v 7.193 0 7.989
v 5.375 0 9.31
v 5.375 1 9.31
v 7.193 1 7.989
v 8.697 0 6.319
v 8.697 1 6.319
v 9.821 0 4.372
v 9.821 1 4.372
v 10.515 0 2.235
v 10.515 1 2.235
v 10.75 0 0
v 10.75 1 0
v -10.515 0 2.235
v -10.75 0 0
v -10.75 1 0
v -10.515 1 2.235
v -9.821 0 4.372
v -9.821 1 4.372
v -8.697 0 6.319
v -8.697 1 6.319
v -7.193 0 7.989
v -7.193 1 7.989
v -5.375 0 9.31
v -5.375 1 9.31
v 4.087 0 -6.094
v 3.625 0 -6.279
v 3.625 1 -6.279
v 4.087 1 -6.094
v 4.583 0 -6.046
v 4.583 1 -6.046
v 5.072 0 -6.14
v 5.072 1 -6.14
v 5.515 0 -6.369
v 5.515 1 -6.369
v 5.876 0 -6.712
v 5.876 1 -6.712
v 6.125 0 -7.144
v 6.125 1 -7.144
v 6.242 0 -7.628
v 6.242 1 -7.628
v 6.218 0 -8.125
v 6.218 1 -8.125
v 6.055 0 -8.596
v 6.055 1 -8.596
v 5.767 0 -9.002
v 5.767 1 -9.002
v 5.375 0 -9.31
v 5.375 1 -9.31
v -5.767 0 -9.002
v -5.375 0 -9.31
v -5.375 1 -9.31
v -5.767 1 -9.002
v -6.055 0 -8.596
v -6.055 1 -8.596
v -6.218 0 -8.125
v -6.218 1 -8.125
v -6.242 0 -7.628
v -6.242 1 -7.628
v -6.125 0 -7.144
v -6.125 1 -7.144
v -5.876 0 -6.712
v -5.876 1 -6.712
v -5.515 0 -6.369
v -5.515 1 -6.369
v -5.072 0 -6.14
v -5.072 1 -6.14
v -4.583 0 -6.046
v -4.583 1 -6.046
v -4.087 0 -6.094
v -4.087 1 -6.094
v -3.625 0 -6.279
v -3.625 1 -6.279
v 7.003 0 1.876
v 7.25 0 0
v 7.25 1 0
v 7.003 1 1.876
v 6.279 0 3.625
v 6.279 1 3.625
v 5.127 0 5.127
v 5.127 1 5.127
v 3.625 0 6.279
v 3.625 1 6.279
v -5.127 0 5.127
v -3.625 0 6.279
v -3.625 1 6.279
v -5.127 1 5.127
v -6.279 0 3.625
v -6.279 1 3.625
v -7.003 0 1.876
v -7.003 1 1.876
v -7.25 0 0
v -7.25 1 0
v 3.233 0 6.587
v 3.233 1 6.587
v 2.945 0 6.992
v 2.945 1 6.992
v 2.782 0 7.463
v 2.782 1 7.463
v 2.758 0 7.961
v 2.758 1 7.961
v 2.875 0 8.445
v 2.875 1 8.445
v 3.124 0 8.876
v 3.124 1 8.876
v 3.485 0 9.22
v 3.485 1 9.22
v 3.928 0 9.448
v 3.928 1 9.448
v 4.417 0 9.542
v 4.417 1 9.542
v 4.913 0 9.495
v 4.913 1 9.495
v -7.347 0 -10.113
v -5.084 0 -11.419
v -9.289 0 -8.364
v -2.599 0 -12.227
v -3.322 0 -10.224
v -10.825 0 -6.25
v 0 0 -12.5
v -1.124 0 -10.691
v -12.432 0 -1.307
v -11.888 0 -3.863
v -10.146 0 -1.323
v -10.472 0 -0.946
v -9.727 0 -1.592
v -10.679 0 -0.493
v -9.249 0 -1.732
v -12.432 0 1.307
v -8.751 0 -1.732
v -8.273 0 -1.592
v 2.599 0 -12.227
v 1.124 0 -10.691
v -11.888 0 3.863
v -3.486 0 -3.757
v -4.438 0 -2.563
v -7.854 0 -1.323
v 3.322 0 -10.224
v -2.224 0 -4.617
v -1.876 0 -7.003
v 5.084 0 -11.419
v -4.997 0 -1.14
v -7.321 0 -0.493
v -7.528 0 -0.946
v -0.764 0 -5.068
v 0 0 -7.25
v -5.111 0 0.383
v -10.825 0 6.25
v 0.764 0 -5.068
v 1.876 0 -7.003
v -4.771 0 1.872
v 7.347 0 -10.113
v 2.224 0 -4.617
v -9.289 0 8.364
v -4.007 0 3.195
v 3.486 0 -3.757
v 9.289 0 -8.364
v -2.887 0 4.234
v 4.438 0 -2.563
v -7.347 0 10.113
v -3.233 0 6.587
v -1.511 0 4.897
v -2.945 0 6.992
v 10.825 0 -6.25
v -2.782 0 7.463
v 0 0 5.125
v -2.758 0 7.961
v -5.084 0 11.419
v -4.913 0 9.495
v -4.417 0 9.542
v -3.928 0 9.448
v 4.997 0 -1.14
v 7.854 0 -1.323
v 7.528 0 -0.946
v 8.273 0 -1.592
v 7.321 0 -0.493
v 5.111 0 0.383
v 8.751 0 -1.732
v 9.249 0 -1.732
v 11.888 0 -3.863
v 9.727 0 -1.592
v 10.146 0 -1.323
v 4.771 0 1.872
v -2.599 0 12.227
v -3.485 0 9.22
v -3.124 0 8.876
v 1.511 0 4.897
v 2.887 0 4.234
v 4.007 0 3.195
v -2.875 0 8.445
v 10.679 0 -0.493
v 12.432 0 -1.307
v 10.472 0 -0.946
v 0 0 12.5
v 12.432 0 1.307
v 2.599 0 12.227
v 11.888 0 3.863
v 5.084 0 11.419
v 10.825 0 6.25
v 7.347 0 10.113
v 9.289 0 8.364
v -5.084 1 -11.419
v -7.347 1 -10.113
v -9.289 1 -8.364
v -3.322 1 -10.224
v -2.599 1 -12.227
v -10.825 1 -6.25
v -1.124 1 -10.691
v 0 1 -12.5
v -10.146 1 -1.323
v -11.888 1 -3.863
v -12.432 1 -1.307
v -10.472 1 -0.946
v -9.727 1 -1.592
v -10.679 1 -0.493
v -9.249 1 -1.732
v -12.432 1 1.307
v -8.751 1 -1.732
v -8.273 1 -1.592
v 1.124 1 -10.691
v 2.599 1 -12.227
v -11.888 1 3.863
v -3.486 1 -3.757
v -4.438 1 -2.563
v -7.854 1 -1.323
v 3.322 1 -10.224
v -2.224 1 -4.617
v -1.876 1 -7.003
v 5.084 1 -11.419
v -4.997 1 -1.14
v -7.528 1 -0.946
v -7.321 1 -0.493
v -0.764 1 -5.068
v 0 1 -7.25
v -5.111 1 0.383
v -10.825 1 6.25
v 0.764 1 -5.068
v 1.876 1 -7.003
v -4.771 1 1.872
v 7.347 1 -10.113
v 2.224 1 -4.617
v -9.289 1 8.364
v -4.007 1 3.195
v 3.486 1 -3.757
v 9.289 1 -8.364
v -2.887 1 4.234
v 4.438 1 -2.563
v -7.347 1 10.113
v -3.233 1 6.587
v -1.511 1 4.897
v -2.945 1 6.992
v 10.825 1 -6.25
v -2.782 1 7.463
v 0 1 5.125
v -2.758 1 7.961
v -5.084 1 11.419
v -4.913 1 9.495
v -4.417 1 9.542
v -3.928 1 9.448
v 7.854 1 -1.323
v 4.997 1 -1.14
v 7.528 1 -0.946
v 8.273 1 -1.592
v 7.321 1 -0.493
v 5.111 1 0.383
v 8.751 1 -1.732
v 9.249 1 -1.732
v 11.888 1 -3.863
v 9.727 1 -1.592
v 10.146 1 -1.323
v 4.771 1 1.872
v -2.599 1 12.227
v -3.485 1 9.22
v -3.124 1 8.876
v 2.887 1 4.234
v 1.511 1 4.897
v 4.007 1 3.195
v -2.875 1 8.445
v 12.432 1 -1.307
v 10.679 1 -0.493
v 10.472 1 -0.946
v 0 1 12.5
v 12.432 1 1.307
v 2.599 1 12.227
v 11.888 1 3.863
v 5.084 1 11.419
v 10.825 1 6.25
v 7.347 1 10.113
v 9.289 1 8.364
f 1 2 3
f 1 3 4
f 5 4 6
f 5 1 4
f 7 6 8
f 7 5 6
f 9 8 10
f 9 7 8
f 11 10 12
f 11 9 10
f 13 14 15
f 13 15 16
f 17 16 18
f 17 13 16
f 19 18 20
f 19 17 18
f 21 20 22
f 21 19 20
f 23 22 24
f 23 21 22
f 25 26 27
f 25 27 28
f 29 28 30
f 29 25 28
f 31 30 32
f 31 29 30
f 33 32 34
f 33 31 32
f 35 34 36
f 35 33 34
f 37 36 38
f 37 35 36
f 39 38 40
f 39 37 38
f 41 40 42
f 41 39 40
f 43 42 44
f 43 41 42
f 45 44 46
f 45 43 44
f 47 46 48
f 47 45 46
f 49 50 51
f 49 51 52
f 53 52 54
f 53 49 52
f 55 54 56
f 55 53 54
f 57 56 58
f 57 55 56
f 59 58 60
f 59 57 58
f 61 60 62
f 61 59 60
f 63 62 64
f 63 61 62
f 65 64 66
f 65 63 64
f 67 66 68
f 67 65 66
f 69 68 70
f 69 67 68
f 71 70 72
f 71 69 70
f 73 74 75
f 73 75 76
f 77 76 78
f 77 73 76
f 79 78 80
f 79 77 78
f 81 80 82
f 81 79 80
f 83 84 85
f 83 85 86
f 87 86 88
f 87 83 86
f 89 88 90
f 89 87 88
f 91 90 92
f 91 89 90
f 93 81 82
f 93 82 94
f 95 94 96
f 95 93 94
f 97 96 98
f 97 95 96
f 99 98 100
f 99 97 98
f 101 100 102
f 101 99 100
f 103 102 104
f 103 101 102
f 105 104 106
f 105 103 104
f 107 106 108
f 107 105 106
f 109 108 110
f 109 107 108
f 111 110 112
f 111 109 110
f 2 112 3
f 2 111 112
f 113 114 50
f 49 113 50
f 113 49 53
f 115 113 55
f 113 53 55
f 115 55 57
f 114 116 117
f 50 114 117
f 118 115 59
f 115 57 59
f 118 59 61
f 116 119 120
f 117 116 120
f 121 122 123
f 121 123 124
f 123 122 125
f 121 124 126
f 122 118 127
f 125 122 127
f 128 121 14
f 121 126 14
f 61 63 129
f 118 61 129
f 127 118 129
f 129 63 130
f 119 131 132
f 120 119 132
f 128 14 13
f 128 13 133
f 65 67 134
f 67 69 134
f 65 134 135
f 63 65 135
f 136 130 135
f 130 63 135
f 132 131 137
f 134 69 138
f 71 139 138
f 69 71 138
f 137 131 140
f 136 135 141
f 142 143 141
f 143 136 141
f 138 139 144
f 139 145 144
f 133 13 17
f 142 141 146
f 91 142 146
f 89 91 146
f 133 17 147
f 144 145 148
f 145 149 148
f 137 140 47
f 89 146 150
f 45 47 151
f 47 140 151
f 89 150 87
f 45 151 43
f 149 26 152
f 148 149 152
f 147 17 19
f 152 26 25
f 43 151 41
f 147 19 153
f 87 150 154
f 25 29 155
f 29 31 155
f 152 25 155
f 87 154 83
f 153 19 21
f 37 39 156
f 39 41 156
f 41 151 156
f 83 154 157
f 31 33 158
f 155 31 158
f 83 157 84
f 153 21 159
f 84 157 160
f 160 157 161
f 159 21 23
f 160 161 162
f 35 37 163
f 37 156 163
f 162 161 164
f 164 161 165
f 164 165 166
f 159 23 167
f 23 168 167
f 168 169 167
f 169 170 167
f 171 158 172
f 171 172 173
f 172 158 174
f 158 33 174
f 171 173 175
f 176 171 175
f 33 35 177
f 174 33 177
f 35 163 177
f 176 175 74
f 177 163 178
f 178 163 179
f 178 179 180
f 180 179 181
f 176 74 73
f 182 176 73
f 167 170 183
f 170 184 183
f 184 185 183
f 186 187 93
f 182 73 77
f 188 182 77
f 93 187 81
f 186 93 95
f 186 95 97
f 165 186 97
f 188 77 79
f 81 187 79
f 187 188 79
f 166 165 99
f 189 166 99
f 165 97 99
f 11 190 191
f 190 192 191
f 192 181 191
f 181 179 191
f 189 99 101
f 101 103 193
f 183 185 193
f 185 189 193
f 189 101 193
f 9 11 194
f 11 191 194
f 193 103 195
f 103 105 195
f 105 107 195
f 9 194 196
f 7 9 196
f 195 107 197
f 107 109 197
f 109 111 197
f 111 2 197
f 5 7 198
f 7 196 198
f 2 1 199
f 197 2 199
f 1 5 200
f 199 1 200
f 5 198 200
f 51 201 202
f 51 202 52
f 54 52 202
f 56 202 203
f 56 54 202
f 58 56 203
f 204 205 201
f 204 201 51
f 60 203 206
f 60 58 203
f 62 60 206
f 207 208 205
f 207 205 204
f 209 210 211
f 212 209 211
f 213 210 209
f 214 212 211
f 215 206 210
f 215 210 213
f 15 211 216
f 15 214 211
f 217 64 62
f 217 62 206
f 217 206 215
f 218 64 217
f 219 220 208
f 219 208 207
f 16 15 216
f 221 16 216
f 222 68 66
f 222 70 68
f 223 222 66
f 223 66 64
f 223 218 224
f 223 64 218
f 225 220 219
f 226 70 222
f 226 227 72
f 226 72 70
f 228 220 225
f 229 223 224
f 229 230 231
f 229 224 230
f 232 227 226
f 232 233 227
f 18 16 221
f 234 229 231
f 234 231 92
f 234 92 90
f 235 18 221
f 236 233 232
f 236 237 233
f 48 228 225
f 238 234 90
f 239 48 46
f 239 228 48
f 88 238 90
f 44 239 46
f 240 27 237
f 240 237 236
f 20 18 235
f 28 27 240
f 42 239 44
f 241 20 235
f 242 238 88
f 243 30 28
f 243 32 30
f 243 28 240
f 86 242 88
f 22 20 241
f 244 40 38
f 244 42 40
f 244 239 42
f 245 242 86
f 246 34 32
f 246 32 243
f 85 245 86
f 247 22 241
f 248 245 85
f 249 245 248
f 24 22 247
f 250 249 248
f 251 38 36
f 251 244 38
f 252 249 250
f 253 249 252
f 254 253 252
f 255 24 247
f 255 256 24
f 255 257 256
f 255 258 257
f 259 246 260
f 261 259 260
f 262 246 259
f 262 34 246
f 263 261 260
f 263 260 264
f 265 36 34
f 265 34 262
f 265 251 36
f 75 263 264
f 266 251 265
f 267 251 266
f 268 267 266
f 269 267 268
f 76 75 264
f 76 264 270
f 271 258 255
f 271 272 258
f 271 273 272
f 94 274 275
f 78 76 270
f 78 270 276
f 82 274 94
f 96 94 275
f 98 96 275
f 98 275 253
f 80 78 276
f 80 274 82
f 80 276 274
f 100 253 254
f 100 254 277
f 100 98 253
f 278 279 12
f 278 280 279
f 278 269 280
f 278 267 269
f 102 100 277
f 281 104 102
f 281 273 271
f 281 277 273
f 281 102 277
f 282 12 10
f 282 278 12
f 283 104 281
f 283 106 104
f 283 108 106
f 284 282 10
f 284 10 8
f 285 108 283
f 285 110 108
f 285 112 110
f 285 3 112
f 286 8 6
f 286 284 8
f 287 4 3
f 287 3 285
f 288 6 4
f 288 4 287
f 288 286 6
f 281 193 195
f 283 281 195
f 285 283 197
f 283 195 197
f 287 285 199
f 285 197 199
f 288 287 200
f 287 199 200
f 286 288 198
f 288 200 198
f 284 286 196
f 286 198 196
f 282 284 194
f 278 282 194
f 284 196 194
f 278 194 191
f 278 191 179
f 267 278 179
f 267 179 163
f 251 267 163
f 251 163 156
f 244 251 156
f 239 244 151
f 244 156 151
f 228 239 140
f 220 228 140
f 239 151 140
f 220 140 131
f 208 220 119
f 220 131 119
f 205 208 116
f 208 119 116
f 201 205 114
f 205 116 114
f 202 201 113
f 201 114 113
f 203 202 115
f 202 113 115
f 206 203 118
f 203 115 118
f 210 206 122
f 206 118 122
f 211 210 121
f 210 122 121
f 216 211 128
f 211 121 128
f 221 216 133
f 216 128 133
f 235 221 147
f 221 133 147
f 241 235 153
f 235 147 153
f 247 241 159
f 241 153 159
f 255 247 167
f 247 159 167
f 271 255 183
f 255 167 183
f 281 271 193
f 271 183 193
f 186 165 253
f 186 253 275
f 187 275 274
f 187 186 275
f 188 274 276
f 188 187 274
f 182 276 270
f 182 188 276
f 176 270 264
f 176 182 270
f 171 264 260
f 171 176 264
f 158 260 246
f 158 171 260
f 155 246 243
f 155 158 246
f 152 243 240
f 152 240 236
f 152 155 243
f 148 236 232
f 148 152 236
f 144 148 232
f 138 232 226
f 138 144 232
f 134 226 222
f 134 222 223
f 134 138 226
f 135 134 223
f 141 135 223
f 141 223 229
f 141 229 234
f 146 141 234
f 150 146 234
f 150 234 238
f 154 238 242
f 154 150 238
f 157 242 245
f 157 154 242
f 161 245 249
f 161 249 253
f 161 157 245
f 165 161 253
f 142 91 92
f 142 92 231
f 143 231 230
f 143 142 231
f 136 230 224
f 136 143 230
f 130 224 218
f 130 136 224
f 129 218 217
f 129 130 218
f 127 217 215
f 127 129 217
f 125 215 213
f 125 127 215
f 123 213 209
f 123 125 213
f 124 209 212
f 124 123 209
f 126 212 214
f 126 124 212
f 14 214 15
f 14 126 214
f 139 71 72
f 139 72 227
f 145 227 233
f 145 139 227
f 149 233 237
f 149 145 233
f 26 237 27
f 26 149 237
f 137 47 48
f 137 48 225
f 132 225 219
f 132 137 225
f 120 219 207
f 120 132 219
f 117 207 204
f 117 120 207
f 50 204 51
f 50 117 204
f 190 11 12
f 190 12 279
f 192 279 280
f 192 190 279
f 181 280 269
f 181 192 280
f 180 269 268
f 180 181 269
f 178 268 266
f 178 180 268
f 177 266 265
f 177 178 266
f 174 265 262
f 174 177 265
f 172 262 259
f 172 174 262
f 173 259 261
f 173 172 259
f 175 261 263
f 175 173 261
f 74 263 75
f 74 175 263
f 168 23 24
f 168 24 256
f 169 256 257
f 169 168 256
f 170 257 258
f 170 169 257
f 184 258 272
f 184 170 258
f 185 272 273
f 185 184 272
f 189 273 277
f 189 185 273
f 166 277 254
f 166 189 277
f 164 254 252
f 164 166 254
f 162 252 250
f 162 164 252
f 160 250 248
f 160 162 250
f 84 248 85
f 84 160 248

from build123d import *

# Parameters (mm, degrees)
CROQUIS1_R              = 12.5
CROQUIS1_R_2            = 5.125
SALIENTE_EXTRUIR1_DEPTH = 1


with BuildPart() as part:
    # Croquis1 → Saliente-Extruir1 (new body)
    with BuildSketch(Plane(origin=(0, 0, 0), x_dir=(1, 0, 0), z_dir=(0, 1, 0))):
        with Locations(Location((0, 0, 0), (0, 0, 270))):
            Circle(CROQUIS1_R)
        with Locations(Location((0, 0, 0), (0, 0, 270))):
            Circle(CROQUIS1_R_2, mode=Mode.SUBTRACT)
        with BuildLine():
            ThreePointArc((5.375, 9.309773091), (0, 10.75), (-5.375, 9.309773091))
            ThreePointArc((-5.375, 9.309773091), (-6.015544457, 6.919228634), (-3.625, 6.278684177))
            ThreePointArc((-3.625, 6.278684177), (0, 7.25), (3.625, 6.278684177))
            ThreePointArc((3.625, 6.278684177), (6.015544457, 6.919228634), (5.375, 9.309773091))
        make_face(mode=Mode.SUBTRACT)
        with BuildLine():
            ThreePointArc((5.375, -9.309773091), (9.309773091, -5.375), (10.75, 0))
            ThreePointArc((10.75, 0), (9, 1.75), (7.25, 0))
            ThreePointArc((7.25, 0), (6.278684177, -3.625), (3.625, -6.278684177))
            ThreePointArc((3.625, -6.278684177), (2.984455543, -8.669228634), (5.375, -9.309773091))
        make_face(mode=Mode.SUBTRACT)
        with BuildLine():
            ThreePointArc((-10.75, 0), (-9.309773091, -5.375), (-5.375, -9.309773091))
            ThreePointArc((-5.375, -9.309773091), (-2.984455543, -8.669228634), (-3.625, -6.278684177))
            ThreePointArc((-3.625, -6.278684177), (-6.278684177, -3.625), (-7.25, 0))
            ThreePointArc((-7.25, 0), (-9, 1.75), (-10.75, 0))
        make_face(mode=Mode.SUBTRACT)
    extrude(amount=SALIENTE_EXTRUIR1_DEPTH)


solid = part.part
